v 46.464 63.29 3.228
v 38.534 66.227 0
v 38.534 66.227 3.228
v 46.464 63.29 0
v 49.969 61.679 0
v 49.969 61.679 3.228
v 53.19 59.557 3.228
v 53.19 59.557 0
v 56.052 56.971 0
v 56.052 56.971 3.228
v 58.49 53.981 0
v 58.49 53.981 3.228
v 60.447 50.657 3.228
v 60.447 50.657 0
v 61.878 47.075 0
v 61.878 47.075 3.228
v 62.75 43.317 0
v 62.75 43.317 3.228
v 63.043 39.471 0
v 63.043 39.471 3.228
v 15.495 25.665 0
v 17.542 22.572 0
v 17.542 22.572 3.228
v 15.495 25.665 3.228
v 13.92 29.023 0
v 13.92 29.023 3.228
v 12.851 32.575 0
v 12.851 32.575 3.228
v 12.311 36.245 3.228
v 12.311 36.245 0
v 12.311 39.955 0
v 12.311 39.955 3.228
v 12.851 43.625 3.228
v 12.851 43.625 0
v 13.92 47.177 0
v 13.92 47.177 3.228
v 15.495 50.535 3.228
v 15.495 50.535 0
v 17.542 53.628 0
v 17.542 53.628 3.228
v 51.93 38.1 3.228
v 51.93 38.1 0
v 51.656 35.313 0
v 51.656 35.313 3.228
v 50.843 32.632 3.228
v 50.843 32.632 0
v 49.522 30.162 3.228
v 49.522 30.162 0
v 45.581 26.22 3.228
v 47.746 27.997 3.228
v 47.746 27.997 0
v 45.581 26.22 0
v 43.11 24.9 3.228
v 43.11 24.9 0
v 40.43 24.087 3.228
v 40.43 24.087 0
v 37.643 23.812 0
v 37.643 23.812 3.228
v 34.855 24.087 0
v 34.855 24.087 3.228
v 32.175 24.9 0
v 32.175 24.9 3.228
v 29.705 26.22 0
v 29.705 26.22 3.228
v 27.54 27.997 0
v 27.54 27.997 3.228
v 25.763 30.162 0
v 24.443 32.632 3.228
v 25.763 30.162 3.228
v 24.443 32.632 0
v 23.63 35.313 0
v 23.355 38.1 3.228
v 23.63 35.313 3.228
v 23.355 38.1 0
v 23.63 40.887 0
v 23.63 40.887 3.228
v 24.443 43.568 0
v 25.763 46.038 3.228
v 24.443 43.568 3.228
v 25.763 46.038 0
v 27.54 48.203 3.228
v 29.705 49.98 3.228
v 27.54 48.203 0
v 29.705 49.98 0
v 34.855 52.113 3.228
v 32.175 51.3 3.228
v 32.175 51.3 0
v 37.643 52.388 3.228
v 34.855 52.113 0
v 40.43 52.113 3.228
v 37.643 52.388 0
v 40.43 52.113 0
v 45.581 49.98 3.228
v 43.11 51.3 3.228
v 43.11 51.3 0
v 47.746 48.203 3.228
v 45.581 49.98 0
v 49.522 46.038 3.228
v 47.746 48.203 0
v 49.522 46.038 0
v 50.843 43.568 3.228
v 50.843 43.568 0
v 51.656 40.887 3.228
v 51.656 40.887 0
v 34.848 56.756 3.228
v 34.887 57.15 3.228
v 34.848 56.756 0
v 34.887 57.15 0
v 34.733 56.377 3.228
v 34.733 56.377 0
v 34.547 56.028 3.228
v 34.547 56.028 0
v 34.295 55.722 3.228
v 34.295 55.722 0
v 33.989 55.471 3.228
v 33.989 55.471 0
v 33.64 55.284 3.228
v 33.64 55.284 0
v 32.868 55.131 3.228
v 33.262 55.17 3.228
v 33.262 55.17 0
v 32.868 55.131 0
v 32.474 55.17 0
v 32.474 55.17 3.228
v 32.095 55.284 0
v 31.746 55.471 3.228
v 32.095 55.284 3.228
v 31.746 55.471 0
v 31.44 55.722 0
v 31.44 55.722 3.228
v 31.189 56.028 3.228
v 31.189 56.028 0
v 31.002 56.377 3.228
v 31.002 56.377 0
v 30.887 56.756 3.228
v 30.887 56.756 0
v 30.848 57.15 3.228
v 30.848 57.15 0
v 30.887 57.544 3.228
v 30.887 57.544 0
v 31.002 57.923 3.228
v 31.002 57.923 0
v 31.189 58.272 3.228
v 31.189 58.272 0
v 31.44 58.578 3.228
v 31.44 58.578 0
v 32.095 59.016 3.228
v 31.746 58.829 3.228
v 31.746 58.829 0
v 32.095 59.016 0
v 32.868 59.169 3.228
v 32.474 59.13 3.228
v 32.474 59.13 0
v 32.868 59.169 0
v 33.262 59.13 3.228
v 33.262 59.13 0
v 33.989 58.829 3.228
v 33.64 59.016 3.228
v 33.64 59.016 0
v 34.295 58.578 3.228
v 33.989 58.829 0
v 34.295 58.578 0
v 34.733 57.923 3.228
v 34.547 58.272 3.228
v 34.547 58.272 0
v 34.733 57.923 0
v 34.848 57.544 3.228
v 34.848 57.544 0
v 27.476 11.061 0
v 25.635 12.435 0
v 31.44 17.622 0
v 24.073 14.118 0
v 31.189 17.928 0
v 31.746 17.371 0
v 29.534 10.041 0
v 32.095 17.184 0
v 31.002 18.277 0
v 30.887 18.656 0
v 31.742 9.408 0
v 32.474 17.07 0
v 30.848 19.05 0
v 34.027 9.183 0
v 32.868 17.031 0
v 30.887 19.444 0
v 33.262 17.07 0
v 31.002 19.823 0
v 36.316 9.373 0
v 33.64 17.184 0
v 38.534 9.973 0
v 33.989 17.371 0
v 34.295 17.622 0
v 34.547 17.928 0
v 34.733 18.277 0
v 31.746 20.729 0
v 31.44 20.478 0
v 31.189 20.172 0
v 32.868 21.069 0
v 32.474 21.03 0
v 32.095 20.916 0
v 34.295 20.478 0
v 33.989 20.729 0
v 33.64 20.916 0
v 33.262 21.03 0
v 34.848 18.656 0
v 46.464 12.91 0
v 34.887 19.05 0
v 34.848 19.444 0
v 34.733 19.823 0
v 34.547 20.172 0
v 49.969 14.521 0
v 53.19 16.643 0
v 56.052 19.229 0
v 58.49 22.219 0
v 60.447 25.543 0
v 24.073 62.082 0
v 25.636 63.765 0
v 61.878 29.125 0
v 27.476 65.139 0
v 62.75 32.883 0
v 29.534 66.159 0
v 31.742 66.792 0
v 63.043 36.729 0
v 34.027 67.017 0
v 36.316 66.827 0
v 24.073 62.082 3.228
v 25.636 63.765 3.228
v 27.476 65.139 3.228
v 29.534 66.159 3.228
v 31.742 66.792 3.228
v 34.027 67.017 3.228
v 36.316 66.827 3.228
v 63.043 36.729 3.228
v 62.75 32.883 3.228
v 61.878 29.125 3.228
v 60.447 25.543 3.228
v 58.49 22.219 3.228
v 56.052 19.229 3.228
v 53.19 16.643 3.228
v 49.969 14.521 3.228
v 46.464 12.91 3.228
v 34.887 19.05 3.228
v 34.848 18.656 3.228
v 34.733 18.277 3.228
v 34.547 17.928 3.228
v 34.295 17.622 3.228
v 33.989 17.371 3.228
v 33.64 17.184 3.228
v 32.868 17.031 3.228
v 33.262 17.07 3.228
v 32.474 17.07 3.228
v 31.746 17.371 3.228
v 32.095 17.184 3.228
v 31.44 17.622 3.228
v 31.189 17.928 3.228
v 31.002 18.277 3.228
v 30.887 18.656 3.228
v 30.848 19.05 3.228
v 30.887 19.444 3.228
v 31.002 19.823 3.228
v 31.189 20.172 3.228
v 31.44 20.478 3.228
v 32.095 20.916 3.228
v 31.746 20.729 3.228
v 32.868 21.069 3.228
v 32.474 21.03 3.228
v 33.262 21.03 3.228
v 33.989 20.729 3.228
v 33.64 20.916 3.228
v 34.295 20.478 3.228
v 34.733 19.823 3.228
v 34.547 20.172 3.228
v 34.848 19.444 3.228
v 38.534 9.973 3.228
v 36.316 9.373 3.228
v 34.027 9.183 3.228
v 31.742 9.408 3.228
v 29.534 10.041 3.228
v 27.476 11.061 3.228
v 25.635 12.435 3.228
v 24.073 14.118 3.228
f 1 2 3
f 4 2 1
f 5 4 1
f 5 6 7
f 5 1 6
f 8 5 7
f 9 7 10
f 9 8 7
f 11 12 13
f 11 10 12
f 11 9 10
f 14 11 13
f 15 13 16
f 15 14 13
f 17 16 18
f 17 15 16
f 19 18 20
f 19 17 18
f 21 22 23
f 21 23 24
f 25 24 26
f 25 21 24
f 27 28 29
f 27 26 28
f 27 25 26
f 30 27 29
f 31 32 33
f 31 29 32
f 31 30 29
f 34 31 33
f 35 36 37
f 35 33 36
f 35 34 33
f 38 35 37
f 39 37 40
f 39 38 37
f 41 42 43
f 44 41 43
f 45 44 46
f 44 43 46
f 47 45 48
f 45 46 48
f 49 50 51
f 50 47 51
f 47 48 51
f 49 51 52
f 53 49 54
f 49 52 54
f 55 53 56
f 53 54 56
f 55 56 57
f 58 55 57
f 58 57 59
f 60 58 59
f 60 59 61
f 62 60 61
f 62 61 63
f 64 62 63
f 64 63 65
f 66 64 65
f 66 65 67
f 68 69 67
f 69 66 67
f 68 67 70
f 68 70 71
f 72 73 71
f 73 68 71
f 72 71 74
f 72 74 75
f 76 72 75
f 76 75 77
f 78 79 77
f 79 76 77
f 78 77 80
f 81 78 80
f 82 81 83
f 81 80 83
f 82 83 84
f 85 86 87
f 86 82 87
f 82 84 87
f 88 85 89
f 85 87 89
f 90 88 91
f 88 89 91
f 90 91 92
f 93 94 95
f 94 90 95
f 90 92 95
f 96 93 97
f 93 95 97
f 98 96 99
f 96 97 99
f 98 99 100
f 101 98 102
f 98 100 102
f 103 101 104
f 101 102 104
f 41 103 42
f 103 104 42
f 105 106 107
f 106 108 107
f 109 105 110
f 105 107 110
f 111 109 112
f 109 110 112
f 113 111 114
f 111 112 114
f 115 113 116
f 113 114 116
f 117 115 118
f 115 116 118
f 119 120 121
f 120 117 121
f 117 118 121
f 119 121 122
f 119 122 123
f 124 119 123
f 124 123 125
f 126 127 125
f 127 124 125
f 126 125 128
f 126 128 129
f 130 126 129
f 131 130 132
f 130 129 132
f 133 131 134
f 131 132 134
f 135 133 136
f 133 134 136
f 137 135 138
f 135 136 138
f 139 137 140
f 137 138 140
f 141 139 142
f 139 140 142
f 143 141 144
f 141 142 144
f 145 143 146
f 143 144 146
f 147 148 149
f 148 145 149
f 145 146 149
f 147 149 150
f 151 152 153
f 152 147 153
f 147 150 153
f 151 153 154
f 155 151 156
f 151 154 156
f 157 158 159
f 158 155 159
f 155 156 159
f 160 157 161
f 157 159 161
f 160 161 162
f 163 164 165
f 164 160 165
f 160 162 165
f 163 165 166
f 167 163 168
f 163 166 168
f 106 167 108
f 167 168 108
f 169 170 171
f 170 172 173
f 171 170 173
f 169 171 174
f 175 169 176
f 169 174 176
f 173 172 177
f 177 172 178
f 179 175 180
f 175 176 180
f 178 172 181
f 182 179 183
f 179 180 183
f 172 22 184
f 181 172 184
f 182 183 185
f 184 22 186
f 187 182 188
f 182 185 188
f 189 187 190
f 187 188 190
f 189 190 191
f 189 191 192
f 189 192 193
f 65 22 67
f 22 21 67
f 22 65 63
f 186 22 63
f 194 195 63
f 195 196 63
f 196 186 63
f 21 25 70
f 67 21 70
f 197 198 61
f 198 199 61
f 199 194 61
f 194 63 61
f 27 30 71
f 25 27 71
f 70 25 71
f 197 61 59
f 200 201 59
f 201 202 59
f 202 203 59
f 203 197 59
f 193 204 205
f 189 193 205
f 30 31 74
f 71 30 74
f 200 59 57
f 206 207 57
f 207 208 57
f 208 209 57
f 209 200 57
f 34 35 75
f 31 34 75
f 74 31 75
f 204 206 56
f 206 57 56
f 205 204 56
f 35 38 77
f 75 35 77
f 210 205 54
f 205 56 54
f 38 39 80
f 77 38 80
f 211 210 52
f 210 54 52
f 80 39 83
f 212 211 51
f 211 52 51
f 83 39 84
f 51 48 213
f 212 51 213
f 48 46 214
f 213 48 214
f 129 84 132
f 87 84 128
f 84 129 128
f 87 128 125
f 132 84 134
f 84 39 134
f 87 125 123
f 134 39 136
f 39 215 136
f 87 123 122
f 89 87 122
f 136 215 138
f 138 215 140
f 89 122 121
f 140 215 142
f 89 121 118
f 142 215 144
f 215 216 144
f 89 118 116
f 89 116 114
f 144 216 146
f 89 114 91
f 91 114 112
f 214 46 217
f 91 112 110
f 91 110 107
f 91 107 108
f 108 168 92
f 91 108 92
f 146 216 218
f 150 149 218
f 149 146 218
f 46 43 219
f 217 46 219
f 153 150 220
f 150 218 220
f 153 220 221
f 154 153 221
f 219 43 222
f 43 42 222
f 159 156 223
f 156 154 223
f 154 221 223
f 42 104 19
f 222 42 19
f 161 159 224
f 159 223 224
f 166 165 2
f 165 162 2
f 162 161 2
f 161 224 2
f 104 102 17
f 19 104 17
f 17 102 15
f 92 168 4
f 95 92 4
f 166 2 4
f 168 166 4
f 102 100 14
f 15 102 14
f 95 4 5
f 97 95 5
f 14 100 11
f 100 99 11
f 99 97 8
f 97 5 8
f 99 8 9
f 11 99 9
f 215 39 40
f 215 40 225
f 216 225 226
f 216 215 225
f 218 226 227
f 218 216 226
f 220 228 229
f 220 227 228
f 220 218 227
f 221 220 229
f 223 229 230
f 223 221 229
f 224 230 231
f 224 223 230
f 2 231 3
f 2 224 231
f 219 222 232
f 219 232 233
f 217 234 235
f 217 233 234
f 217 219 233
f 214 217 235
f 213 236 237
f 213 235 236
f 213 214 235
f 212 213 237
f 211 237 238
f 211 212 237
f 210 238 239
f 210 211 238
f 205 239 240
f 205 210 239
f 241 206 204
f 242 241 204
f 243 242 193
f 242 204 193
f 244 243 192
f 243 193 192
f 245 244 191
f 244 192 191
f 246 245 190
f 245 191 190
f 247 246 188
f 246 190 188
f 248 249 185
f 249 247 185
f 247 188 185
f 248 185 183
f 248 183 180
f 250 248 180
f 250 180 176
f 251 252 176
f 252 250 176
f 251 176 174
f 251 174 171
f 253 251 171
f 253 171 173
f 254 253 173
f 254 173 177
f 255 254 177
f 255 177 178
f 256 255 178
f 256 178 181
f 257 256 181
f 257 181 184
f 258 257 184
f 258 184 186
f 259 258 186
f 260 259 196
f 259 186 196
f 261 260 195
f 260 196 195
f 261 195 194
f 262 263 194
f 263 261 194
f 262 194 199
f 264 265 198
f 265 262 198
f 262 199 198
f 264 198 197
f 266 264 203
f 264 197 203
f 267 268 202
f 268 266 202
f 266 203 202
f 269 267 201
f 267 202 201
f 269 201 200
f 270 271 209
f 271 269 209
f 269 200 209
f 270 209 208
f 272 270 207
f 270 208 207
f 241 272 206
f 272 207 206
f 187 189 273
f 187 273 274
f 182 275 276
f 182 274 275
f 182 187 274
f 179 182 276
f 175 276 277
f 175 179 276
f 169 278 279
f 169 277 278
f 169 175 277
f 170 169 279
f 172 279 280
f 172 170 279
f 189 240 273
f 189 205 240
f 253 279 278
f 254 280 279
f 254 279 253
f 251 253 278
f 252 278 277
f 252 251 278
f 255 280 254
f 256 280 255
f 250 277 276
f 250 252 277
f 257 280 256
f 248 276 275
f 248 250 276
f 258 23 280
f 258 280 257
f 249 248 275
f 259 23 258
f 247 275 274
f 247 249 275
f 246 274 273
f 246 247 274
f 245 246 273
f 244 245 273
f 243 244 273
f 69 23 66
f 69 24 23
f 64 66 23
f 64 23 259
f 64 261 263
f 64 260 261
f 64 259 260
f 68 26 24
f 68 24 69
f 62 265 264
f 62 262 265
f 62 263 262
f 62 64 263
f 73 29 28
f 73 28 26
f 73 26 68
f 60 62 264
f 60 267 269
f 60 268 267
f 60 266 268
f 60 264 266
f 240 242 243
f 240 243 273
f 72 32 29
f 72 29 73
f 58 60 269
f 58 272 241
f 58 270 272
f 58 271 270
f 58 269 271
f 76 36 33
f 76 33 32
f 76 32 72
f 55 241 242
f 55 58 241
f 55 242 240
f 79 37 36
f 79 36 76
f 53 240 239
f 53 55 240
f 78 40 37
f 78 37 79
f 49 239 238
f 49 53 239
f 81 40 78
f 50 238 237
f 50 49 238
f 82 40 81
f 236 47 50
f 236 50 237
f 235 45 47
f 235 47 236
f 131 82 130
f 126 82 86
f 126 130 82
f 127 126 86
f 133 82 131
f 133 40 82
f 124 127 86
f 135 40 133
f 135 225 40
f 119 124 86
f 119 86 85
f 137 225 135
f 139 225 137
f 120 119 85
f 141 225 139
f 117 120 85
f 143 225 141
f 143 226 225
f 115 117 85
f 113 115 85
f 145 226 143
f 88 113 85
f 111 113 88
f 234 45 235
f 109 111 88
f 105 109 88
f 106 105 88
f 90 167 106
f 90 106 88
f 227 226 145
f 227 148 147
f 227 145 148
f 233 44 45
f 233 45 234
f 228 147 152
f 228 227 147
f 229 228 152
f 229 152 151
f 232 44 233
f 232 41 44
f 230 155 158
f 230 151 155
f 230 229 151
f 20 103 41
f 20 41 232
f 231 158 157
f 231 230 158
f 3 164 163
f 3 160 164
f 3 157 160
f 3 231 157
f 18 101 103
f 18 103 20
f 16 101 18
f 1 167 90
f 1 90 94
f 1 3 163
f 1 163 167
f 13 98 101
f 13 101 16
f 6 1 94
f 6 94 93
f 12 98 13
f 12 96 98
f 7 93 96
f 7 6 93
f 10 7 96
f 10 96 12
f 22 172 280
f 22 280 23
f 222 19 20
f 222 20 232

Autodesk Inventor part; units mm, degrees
ref_plane "YZ Plane" through (0, 0, 0) normal (1, 0, 0) x (0, 1, 0)
ref_plane "XZ Plane" through (0, 0, 0) normal (0, 1, 0) x (-1, 0, 0)
ref_plane "Work Plane1" through (0, 0, 0) normal (0, 0, 1) x (1, 0, 0)
sketch "Sketch1" plane through (0, 0, 0) normal (0, 0, 1) x (1, 0, 0)
  line L0 (38.5336, 66.2269) -> (46.4641, 63.2899)
  line L1 (63.0428, 39.4709) -> (63.0428, 36.7291)
  line L2 (46.4641, 12.9101) -> (38.5336, 9.9731)
  line L3 (24.0727, 14.1184) -> (17.5423, 22.5716)
  line L4 (17.5423, 53.6284) -> (24.0727, 62.0816)
  circle A0 centre (37.6428, 38.1) radius 14.2875 projected
  circle A1 centre (32.8676, 57.15) radius 2.0193 projected
  circle A2 centre (32.8676, 19.05) radius 2.0193 projected
  line L5 (37.6428, 38.1) -> (32.8676, 57.15) construction
  line L6 (37.6428, 38.1) -> (32.8676, 19.05) construction
  arc A3 (38.5336, 66.2269) -> (24.0727, 62.0816) centre (34.123, 54.3174) ccw
  arc A4 (24.0727, 14.1184) -> (38.5336, 9.9731) centre (34.123, 21.8826) ccw
  arc A5 (17.5423, 53.6284) -> (17.5423, 22.5716) centre (37.6428, 38.1) ccw
  arc A6 (46.4641, 12.9101) -> (63.0428, 36.7291) centre (37.6428, 36.7291) ccw
  arc A7 (63.0428, 39.4709) -> (46.4641, 63.2899) centre (37.6428, 39.4709) ccw
  line L7 (12.2428, 46.8808) -> (12.2428, 25.1015) construction
  point P0 (29.7797, 69.4689)
  point P1 (63.0428, 57.15)
  point P2 (63.0428, 19.05)
  point P3 (29.7797, 6.7311)
  point P4 (5.5461, 38.1)
  point P5 (63.0428, 38.1)
  dimension "d2" = 12.7
  dimension "d3" = 12.7
  dimension "d5" = 25.4
  dimension "d6" = 38.1
  dimension "d7" = 12.7
  dimension "d8" = 25.4
  dimension "d9" = 25.4
ref_plane "Work Plane2" through (21.5824, 22.0396, 3.2283) normal (0, 0, 1) x (0.9852, -0.1712, 0)
extrude "Extrusion1" add sketch "Sketch1" along normal up to surface (3.2283 mm away)
equation "\"d3\" = d2"
equation "\"d9\" = d5"
properties part number "Encoder Mount"
